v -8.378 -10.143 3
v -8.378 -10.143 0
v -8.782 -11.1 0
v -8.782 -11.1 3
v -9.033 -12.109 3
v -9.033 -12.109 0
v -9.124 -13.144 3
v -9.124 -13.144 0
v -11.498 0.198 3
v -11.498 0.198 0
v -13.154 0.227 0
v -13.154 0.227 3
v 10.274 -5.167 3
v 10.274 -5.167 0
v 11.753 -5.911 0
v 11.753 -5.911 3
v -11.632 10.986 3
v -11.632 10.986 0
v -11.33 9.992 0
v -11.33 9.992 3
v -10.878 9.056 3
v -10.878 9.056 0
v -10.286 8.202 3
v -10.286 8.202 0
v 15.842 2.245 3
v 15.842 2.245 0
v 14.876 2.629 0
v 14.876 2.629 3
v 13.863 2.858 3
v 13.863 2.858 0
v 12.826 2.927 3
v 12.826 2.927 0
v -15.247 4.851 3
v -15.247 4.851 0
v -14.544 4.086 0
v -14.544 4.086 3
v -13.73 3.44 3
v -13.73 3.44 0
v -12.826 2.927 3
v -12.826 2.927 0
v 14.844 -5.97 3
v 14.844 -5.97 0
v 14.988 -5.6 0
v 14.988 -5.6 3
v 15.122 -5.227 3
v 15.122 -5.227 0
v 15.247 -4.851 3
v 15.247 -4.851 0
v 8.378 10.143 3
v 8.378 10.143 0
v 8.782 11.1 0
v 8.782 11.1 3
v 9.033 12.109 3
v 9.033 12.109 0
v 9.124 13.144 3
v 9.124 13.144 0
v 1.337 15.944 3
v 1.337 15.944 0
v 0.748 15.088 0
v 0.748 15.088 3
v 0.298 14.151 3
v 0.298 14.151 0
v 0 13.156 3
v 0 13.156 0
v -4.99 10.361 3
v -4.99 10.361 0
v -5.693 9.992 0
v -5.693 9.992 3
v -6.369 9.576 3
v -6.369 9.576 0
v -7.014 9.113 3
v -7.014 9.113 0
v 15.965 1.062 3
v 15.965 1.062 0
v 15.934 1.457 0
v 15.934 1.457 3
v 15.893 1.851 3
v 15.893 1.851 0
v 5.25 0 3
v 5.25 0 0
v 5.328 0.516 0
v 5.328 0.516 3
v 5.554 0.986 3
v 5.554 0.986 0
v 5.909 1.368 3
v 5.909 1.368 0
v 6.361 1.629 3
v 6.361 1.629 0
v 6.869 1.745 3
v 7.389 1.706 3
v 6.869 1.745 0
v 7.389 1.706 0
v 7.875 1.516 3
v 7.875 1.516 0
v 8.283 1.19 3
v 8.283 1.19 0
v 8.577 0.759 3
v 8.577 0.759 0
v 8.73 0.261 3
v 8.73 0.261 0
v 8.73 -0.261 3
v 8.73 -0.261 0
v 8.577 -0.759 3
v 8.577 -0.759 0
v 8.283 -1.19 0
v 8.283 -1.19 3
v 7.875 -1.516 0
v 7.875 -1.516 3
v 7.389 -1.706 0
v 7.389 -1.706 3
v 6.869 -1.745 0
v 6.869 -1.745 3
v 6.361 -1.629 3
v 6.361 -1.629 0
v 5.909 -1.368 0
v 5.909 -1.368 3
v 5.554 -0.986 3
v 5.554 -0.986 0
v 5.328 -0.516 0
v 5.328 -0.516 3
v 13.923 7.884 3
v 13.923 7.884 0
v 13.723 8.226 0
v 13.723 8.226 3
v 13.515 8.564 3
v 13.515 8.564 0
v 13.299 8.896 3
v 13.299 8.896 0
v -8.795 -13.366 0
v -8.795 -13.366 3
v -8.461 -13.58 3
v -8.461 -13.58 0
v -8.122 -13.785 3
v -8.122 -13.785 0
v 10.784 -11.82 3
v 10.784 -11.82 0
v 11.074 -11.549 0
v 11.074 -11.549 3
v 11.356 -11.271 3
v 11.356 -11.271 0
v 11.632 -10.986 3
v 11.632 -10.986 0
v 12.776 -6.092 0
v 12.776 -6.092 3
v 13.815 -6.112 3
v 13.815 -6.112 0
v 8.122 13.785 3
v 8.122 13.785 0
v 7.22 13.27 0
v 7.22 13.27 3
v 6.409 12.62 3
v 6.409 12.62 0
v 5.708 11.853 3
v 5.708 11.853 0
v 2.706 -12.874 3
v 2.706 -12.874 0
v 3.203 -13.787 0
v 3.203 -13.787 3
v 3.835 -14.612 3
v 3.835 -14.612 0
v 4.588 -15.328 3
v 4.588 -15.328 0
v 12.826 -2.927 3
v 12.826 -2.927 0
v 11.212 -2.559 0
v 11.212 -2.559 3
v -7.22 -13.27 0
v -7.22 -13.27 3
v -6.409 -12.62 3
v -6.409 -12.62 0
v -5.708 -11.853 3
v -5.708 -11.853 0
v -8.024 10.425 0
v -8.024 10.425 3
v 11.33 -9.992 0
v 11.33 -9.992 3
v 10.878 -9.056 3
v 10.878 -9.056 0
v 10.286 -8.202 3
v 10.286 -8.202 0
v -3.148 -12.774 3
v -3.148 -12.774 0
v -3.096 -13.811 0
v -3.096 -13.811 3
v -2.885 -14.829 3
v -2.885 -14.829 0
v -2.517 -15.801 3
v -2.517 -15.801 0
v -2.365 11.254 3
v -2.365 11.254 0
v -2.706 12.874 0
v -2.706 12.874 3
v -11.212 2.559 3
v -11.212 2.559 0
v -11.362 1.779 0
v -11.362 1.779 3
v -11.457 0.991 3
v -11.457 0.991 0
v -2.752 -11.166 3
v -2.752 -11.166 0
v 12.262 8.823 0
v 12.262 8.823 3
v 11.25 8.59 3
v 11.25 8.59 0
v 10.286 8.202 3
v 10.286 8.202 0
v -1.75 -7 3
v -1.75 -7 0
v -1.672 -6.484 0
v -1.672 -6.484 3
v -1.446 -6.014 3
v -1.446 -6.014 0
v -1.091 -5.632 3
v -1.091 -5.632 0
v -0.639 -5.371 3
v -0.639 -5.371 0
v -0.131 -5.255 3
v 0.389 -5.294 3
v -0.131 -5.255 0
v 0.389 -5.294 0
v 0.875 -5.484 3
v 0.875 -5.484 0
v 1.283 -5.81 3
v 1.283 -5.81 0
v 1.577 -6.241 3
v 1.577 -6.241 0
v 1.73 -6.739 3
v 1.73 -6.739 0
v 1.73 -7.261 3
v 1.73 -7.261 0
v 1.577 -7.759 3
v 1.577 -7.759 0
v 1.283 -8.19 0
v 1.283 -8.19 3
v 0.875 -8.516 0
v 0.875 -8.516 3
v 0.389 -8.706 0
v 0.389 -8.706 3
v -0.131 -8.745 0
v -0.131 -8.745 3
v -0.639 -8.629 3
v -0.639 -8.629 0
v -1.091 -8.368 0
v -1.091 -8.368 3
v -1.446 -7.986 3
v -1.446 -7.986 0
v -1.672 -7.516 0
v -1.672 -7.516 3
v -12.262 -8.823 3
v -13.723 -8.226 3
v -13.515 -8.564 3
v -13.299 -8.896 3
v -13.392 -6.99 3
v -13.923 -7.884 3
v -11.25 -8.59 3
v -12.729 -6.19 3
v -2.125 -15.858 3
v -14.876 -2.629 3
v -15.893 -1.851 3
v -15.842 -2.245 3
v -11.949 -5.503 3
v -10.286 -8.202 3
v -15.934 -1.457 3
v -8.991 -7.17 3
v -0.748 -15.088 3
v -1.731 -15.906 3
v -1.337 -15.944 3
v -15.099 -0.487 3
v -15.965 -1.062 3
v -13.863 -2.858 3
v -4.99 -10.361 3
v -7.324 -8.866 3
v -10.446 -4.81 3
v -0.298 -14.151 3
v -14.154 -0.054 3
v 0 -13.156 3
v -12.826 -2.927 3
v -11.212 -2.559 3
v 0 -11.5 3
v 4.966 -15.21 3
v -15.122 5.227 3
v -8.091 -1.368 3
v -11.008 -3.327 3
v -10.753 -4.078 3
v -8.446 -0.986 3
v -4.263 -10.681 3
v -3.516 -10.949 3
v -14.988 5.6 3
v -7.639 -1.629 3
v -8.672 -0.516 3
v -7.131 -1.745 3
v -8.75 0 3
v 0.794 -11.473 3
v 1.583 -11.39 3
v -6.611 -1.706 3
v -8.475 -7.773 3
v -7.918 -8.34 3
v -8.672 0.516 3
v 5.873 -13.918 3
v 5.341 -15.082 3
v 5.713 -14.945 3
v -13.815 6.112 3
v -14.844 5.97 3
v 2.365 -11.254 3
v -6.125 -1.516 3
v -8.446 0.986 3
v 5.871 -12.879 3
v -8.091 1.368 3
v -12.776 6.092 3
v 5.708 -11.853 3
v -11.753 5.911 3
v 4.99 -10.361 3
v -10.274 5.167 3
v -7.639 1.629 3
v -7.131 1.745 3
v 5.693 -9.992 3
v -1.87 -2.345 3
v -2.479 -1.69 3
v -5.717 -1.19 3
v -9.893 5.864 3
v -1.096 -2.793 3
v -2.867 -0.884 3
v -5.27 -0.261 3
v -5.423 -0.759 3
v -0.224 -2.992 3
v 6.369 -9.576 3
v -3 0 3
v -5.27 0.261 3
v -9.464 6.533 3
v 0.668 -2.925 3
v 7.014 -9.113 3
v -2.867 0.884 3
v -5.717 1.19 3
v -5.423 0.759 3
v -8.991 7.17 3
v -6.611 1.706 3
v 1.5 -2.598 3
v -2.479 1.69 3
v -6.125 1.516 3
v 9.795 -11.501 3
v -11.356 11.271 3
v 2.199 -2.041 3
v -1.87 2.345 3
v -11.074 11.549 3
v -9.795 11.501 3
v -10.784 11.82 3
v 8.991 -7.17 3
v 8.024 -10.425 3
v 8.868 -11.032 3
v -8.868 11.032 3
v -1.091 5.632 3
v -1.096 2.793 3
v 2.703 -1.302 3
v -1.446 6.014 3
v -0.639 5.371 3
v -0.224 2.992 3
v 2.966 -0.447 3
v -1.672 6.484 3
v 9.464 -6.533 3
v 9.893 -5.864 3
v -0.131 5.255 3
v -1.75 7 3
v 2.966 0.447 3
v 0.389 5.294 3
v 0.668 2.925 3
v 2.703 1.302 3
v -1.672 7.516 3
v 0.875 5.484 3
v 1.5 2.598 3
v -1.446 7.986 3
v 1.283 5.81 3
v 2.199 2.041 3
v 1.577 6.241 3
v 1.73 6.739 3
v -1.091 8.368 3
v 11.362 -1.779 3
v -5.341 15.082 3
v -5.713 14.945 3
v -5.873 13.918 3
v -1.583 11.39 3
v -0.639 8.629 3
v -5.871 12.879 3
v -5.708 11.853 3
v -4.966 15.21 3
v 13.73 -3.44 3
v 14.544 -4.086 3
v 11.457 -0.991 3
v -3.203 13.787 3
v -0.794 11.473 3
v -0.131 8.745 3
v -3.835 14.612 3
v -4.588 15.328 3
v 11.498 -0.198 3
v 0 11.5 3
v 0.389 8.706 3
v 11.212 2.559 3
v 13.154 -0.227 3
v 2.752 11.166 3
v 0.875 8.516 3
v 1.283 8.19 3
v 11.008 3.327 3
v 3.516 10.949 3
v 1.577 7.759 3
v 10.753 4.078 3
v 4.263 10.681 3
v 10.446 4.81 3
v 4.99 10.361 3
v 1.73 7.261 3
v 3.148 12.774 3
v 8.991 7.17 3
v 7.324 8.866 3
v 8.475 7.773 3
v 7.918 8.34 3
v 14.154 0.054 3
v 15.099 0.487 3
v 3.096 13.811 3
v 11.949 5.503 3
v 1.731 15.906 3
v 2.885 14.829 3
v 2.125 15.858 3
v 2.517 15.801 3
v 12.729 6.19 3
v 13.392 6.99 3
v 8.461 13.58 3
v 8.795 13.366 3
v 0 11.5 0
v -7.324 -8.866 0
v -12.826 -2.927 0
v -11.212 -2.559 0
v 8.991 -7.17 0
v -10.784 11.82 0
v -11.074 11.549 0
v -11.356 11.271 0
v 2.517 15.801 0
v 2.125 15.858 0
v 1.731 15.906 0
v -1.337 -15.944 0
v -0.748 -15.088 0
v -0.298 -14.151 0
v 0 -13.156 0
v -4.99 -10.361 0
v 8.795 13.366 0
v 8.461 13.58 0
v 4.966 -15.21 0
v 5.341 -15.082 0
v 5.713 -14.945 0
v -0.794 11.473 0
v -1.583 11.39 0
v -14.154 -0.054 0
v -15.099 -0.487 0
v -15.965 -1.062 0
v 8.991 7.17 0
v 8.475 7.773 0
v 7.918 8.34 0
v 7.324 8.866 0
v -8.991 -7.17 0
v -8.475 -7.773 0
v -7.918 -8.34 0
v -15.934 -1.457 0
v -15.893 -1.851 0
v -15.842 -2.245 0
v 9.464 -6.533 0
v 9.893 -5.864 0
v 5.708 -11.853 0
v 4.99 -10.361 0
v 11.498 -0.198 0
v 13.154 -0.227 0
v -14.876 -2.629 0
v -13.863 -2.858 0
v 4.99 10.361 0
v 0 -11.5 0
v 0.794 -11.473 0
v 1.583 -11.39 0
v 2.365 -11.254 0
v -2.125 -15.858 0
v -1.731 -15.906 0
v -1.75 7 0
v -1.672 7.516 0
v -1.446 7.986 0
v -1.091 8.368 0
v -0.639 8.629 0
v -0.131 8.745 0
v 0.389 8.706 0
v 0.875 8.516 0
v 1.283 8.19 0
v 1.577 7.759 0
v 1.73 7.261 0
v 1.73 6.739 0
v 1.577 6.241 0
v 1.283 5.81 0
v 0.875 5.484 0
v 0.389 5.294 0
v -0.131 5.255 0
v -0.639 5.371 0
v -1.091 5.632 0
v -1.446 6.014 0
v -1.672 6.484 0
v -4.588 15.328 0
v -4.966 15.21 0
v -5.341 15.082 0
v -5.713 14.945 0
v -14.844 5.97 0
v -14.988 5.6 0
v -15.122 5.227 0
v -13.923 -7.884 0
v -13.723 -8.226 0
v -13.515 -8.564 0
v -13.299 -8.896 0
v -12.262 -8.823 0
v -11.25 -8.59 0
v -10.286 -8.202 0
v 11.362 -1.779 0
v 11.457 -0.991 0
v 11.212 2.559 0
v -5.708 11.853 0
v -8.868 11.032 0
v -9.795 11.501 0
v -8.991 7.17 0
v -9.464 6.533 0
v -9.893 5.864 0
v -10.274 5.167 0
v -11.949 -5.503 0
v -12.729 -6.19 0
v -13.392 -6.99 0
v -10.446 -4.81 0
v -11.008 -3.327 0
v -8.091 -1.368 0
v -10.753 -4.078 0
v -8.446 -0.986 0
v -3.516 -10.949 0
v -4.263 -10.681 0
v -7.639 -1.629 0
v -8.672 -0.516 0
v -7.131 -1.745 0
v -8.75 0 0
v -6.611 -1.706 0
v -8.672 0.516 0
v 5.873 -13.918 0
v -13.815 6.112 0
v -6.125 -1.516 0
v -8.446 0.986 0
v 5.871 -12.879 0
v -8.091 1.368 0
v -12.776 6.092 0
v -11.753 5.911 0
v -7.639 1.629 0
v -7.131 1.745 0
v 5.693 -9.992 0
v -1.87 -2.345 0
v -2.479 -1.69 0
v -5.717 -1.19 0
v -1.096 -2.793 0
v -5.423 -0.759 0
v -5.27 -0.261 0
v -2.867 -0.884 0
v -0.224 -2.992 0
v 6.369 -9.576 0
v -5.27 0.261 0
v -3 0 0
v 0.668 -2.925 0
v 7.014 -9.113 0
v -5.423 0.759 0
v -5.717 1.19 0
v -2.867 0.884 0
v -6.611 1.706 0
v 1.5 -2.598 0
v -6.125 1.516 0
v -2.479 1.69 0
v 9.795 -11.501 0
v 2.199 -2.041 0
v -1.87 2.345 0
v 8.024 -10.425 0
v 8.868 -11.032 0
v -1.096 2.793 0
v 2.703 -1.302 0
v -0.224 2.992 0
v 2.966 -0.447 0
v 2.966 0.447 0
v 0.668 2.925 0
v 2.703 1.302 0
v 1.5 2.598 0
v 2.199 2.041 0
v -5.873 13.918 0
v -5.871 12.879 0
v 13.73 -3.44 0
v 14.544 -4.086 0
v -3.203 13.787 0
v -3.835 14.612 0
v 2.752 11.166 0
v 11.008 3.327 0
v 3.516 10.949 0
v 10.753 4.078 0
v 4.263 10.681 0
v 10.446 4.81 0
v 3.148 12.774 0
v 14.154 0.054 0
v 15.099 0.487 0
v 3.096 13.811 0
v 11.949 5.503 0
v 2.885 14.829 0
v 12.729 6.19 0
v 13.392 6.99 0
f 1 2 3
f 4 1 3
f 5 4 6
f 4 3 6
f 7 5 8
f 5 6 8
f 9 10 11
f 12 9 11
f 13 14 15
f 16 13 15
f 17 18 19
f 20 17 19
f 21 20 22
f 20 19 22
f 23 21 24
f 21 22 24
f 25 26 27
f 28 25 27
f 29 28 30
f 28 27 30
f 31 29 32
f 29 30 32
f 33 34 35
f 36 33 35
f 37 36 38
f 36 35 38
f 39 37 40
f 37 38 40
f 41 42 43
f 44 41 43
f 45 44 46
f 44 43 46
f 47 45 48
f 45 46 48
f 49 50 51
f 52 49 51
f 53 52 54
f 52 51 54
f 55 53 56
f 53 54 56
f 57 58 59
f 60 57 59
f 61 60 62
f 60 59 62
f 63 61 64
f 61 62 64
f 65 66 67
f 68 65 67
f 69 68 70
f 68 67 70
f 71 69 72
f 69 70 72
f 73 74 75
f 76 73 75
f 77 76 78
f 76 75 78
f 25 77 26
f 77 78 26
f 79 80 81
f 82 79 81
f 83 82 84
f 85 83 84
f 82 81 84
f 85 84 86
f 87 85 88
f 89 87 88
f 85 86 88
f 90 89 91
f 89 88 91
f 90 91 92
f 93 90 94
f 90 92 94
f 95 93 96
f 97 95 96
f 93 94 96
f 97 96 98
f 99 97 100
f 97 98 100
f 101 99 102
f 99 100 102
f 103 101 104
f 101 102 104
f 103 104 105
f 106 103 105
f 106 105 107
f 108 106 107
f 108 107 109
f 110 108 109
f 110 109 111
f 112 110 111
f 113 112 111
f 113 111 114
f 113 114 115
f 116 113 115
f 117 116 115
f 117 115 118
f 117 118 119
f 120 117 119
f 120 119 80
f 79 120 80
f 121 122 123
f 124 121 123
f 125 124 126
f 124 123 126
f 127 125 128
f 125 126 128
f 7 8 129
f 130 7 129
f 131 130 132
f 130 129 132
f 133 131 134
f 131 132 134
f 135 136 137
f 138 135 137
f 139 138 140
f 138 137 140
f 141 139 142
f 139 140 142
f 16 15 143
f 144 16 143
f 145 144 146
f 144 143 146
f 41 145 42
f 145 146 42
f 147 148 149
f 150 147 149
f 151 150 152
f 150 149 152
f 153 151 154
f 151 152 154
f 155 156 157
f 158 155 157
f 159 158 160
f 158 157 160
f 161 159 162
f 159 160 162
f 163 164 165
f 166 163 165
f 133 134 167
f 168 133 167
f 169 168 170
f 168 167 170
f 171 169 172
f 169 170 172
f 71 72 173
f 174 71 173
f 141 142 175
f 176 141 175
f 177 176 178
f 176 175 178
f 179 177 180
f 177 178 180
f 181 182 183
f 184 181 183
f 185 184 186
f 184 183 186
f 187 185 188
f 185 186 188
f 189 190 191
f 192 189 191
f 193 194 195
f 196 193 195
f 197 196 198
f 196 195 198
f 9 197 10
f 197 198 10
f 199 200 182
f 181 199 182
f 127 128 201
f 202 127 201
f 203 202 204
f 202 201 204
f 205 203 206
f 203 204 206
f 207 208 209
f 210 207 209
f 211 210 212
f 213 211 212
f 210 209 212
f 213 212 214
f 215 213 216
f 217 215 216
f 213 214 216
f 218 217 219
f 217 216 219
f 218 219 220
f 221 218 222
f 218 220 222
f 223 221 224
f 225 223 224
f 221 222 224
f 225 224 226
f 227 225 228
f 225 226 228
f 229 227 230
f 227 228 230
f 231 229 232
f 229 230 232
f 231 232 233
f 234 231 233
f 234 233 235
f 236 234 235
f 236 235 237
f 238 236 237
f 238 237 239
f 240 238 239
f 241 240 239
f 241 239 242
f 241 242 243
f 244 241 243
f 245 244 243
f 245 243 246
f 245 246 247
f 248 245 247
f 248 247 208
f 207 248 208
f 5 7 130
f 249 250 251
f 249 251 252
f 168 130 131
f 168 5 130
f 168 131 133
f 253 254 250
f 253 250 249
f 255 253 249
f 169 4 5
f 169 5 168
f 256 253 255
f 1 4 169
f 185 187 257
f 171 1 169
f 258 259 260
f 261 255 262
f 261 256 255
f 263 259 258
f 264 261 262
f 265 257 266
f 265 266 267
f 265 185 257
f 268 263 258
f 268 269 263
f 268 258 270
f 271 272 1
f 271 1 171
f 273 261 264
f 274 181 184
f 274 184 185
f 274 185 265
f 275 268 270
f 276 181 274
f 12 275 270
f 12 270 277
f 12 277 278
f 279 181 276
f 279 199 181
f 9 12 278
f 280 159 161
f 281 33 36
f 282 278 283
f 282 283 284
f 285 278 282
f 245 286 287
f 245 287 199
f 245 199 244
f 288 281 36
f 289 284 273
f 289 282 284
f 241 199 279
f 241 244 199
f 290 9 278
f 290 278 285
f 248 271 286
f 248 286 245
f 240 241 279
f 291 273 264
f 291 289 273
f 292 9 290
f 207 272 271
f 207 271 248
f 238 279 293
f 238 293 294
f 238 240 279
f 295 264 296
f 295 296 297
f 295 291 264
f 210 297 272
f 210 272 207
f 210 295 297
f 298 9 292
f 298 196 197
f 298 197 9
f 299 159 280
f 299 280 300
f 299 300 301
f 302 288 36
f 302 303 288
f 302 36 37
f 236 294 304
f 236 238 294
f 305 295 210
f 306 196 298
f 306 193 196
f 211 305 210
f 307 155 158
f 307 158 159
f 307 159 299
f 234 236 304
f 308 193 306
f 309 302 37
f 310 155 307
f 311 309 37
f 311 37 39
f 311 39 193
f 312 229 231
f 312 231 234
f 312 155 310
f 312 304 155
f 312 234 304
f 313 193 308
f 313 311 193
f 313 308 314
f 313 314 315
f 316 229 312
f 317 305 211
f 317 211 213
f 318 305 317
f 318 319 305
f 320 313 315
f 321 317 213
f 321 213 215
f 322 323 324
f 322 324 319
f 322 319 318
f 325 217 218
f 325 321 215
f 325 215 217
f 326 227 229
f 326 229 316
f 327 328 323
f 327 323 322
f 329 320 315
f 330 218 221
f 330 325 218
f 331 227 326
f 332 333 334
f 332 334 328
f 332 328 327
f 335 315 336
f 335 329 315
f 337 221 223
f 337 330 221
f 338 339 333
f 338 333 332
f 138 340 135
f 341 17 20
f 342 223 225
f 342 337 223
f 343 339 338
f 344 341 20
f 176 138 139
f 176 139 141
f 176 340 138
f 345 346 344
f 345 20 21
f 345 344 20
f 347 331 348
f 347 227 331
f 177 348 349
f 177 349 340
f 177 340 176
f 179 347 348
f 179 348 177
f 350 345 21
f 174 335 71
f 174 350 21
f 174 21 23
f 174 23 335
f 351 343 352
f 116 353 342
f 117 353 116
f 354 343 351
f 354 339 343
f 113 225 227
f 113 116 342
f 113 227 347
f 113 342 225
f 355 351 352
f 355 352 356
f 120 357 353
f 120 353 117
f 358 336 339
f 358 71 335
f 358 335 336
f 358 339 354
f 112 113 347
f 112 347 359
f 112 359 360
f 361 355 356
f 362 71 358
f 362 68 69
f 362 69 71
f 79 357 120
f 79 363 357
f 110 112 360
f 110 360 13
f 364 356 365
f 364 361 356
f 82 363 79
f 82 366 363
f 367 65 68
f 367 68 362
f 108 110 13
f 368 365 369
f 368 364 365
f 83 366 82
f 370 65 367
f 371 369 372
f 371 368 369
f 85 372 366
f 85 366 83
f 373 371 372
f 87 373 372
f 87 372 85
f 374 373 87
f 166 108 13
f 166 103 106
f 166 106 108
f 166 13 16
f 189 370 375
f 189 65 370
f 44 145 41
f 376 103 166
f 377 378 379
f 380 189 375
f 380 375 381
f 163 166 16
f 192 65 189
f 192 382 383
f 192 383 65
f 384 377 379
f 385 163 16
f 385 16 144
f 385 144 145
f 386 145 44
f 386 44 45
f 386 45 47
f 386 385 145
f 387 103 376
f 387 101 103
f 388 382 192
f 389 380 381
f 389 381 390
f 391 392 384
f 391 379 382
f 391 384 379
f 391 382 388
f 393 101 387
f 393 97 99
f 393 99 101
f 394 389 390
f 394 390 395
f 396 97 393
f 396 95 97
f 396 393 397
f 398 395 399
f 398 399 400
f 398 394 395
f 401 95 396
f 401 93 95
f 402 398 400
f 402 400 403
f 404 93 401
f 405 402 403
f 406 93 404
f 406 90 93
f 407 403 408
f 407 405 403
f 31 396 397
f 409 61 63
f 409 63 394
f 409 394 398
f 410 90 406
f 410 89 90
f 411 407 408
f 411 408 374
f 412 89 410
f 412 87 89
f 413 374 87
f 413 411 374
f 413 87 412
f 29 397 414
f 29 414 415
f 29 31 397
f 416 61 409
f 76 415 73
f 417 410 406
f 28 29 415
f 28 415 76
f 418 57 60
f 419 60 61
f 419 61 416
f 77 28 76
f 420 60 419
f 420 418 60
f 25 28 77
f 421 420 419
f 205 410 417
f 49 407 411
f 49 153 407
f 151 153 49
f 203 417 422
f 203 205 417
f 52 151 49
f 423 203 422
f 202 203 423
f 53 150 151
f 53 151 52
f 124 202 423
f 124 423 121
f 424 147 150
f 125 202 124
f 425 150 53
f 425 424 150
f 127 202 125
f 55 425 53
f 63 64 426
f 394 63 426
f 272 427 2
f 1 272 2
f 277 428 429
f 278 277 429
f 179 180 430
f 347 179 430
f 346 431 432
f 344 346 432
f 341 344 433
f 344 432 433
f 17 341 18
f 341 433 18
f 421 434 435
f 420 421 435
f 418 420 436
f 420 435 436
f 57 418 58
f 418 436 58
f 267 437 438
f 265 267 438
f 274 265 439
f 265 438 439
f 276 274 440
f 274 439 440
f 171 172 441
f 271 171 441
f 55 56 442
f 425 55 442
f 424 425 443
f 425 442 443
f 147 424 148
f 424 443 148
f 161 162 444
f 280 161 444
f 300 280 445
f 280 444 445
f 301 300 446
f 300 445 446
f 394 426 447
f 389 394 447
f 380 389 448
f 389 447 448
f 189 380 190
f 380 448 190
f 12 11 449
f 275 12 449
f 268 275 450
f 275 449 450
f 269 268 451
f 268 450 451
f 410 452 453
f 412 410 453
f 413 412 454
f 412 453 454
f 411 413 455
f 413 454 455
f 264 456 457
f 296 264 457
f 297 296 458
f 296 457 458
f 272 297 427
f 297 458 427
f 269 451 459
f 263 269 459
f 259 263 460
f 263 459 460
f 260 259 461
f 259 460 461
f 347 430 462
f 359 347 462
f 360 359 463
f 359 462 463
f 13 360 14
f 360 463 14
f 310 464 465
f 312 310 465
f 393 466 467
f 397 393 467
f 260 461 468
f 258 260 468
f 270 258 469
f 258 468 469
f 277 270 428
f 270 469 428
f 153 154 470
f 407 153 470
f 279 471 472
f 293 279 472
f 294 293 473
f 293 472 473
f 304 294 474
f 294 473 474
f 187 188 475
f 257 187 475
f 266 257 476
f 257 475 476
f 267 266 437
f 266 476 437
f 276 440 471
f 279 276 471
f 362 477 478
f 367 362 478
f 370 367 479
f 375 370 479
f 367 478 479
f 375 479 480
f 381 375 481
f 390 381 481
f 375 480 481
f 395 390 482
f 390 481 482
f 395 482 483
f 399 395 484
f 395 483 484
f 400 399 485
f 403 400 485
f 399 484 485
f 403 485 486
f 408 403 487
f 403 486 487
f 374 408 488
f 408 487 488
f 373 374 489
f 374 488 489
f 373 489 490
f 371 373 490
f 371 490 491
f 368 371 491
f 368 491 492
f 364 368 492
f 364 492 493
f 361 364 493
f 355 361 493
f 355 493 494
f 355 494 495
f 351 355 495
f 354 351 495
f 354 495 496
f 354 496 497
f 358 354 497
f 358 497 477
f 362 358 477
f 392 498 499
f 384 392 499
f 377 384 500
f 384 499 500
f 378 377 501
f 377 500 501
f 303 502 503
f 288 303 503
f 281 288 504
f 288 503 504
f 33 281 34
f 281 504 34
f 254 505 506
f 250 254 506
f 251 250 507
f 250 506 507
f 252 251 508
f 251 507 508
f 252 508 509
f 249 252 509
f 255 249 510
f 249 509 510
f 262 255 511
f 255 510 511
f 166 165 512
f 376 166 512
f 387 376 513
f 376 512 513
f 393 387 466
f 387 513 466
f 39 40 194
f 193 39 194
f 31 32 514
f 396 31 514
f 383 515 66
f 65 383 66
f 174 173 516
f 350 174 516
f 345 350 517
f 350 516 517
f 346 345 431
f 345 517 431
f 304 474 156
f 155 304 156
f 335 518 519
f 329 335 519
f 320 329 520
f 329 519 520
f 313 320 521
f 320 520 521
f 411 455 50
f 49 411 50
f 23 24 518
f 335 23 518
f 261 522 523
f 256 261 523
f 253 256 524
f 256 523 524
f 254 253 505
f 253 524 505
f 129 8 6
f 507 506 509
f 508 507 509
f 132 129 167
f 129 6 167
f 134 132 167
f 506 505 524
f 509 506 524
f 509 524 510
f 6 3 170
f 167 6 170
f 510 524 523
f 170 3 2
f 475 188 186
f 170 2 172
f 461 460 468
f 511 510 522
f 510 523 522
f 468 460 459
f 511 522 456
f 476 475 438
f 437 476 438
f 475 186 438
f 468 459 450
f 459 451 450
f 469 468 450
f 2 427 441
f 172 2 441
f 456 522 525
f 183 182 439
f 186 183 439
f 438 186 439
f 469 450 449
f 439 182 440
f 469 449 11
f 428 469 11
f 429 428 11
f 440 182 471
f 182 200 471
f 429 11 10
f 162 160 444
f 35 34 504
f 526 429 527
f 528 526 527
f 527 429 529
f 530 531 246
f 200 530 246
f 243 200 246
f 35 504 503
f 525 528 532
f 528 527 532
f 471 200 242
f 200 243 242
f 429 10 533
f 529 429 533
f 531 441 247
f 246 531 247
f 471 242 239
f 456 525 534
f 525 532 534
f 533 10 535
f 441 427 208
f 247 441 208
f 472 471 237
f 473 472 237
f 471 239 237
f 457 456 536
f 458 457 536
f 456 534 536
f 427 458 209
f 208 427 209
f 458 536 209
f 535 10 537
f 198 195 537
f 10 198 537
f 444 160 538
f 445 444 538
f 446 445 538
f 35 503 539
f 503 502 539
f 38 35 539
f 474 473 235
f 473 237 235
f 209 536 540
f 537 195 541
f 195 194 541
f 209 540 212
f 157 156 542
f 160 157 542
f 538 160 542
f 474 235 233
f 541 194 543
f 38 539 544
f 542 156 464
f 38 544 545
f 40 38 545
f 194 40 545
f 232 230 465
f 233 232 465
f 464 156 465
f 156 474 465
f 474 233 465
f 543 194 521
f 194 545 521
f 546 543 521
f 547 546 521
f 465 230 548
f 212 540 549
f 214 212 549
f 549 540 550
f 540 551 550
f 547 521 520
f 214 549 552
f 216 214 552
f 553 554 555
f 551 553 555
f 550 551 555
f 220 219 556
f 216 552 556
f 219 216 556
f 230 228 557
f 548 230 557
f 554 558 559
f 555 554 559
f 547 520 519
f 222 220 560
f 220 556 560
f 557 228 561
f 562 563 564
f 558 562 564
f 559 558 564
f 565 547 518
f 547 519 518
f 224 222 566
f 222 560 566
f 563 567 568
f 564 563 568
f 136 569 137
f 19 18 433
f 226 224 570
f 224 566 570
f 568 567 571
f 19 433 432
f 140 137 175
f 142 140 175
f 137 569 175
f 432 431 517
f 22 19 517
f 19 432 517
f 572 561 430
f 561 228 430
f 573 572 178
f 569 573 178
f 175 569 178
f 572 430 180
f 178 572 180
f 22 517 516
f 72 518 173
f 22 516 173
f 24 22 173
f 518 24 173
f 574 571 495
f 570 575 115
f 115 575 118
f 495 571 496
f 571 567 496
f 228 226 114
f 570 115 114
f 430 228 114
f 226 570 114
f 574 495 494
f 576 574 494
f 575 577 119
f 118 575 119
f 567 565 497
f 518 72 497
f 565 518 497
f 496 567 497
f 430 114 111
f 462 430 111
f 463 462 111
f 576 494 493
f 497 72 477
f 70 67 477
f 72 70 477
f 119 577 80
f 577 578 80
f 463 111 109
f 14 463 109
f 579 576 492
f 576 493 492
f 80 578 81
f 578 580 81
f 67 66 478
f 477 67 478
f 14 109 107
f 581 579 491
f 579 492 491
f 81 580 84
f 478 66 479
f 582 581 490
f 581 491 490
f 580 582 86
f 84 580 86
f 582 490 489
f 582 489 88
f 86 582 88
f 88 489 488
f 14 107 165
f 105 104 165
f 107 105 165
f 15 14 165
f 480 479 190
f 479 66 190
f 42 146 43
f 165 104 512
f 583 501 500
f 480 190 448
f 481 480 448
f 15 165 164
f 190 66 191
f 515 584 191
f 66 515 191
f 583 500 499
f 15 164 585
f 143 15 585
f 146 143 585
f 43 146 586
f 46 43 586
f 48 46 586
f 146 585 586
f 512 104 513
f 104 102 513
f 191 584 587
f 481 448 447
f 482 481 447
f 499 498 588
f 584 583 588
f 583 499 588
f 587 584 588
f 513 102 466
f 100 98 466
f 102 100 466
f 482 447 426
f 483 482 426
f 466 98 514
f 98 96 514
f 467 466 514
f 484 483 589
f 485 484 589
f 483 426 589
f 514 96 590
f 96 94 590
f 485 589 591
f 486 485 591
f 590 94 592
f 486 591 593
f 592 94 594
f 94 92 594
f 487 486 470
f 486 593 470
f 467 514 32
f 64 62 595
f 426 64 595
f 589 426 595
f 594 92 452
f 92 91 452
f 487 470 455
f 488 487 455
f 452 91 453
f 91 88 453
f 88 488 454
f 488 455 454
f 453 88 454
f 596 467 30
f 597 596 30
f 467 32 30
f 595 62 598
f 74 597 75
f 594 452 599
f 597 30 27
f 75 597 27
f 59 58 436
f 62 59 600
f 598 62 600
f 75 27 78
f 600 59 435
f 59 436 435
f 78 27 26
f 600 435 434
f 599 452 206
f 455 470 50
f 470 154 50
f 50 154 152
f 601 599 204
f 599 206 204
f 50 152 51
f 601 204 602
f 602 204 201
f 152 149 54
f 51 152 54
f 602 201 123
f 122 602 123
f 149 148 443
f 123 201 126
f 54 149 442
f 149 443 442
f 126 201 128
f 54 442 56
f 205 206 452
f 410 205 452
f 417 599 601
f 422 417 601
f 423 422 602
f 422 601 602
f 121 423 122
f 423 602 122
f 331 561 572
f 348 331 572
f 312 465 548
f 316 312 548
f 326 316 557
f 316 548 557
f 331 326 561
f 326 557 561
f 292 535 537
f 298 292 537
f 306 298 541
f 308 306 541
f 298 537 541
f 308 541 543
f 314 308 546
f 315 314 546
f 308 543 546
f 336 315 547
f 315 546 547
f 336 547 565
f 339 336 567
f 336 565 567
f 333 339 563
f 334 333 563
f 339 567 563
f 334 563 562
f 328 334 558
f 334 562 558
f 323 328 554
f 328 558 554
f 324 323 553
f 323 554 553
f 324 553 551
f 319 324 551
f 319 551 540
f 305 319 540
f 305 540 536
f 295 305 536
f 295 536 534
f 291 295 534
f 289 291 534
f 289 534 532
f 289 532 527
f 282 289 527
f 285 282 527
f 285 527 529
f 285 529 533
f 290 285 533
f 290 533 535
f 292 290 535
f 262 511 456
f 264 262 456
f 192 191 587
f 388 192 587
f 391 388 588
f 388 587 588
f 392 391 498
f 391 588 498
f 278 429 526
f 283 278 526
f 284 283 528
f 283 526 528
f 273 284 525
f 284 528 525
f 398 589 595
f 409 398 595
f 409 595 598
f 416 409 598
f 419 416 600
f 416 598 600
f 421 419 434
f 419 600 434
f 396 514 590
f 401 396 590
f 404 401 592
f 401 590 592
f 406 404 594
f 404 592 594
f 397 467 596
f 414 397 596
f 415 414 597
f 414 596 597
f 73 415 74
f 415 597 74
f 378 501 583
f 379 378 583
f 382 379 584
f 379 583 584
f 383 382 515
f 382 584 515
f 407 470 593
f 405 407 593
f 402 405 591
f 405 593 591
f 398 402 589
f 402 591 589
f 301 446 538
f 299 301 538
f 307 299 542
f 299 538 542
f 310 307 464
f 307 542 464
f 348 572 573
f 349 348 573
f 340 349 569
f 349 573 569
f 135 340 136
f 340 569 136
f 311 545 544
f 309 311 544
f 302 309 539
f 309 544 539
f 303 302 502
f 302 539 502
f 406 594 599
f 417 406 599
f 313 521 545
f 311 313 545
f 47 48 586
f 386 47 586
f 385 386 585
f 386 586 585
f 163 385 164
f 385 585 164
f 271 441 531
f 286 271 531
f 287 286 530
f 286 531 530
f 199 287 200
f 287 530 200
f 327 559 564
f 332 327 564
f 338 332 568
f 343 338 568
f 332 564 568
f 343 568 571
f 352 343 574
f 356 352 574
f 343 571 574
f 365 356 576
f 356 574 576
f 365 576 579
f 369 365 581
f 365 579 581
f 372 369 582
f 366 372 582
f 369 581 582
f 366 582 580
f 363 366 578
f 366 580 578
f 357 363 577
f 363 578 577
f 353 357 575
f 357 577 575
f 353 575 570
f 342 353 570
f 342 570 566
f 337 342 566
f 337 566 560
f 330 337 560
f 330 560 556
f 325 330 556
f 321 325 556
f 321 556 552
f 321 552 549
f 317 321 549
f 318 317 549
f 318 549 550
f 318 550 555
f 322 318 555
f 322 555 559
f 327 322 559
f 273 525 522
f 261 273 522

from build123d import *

# Parameters (mm, degrees)
BOSS_EXTRU_1_DEPTH           = 3
R_P_TITION_CIRCULAIRE2_COUNT = 14
ESQUISSE5_R                  = 11.5
BOSS_EXTRU_2_DEPTH           = 3
ESQUISSE6_R                  = 3
ESQUISSE6_R_2                = 1.75
ENL_V_MAT_EXTRU_1_DEPTH      = 4


with BuildPart() as part:
    # Esquisse4 → Boss.-Extru.1 (new body)
    with BuildSketch(Plane.XY):
        with BuildLine():
            Line((0, 13.155696691), (0, 11.5))
            ThreePointArc((0, 11.5), (1.385979557, 11.416175396), (2.751754038, 11.165923594))
            Line((2.751754038, 11.165923594), (3.147934042, 12.773522094))
            ThreePointArc((3.147934042, 12.773522094), (3.010357566, 14.324173734), (2.517223611, 15.800746352))
            ThreePointArc((2.517223611, 15.800746352), (1.928319383, 15.883374464), (1.336751397, 15.944061456))
            ThreePointArc((1.336751397, 15.944061456), (0.504624377, 14.628382005), (0, 13.155696691))
        make_face()
    extrude(amount=BOSS_EXTRU_1_DEPTH)


with BuildPart() as r_p_tition_circulaire2_1:
    # Répétition circulaire2: pattern copy
    add(part.part.rotate(Axis((0, 0, 0), (0, 0, 1)), 1 * 360 / R_P_TITION_CIRCULAIRE2_COUNT))


with BuildPart() as r_p_tition_circulaire2_2:
    # Répétition circulaire2: pattern copy
    add(part.part.rotate(Axis((0, 0, 0), (0, 0, 1)), 2 * 360 / R_P_TITION_CIRCULAIRE2_COUNT))


with BuildPart() as r_p_tition_circulaire2_3:
    # Répétition circulaire2: pattern copy
    add(part.part.rotate(Axis((0, 0, 0), (0, 0, 1)), 3 * 360 / R_P_TITION_CIRCULAIRE2_COUNT))


with BuildPart() as r_p_tition_circulaire2_4:
    # Répétition circulaire2: pattern copy
    add(part.part.rotate(Axis((0, 0, 0), (0, 0, 1)), 4 * 360 / R_P_TITION_CIRCULAIRE2_COUNT))


with BuildPart() as r_p_tition_circulaire2_5:
    # Répétition circulaire2: pattern copy
    add(part.part.rotate(Axis((0, 0, 0), (0, 0, 1)), 5 * 360 / R_P_TITION_CIRCULAIRE2_COUNT))


with BuildPart() as r_p_tition_circulaire2_6:
    # Répétition circulaire2: pattern copy
    add(part.part.rotate(Axis((0, 0, 0), (0, 0, 1)), 6 * 360 / R_P_TITION_CIRCULAIRE2_COUNT))


with BuildPart() as r_p_tition_circulaire2_7:
    # Répétition circulaire2: pattern copy
    add(part.part.rotate(Axis((0, 0, 0), (0, 0, 1)), 7 * 360 / R_P_TITION_CIRCULAIRE2_COUNT))


with BuildPart() as r_p_tition_circulaire2_8:
    # Répétition circulaire2: pattern copy
    add(part.part.rotate(Axis((0, 0, 0), (0, 0, 1)), 8 * 360 / R_P_TITION_CIRCULAIRE2_COUNT))


with BuildPart() as r_p_tition_circulaire2_9:
    # Répétition circulaire2: pattern copy
    add(part.part.rotate(Axis((0, 0, 0), (0, 0, 1)), 9 * 360 / R_P_TITION_CIRCULAIRE2_COUNT))


with BuildPart() as r_p_tition_circulaire2_10:
    # Répétition circulaire2: pattern copy
    add(part.part.rotate(Axis((0, 0, 0), (0, 0, 1)), 10 * 360 / R_P_TITION_CIRCULAIRE2_COUNT))


with BuildPart() as r_p_tition_circulaire2_11:
    # Répétition circulaire2: pattern copy
    add(part.part.rotate(Axis((0, 0, 0), (0, 0, 1)), 11 * 360 / R_P_TITION_CIRCULAIRE2_COUNT))


with BuildPart() as r_p_tition_circulaire2_12:
    # Répétition circulaire2: pattern copy
    add(part.part.rotate(Axis((0, 0, 0), (0, 0, 1)), 12 * 360 / R_P_TITION_CIRCULAIRE2_COUNT))


with BuildPart() as r_p_tition_circulaire2_13:
    # Répétition circulaire2: pattern copy
    add(part.part.rotate(Axis((0, 0, 0), (0, 0, 1)), 13 * 360 / R_P_TITION_CIRCULAIRE2_COUNT))


with BuildPart() as part_1:
    add(part.part)

    add(r_p_tition_circulaire2_1.part)  # Boss.-Extru.2 merges Répétition circulaire2_1

    add(r_p_tition_circulaire2_2.part)  # Boss.-Extru.2 merges Répétition circulaire2_2

    add(r_p_tition_circulaire2_3.part)  # Boss.-Extru.2 merges Répétition circulaire2_3

    add(r_p_tition_circulaire2_4.part)  # Boss.-Extru.2 merges Répétition circulaire2_4

    add(r_p_tition_circulaire2_5.part)  # Boss.-Extru.2 merges Répétition circulaire2_5

    add(r_p_tition_circulaire2_6.part)  # Boss.-Extru.2 merges Répétition circulaire2_6

    add(r_p_tition_circulaire2_7.part)  # Boss.-Extru.2 merges Répétition circulaire2_7

    add(r_p_tition_circulaire2_8.part)  # Boss.-Extru.2 merges Répétition circulaire2_8

    add(r_p_tition_circulaire2_9.part)  # Boss.-Extru.2 merges Répétition circulaire2_9

    add(r_p_tition_circulaire2_10.part)  # Boss.-Extru.2 merges Répétition circulaire2_10

    add(r_p_tition_circulaire2_11.part)  # Boss.-Extru.2 merges Répétition circulaire2_11

    add(r_p_tition_circulaire2_12.part)  # Boss.-Extru.2 merges Répétition circulaire2_12

    add(r_p_tition_circulaire2_13.part)  # Boss.-Extru.2 merges Répétition circulaire2_13
    # Esquisse5 → Boss.-Extru.2 (add)
    with BuildSketch(Plane.XY):
        Circle(ESQUISSE5_R)
    extrude(amount=BOSS_EXTRU_2_DEPTH)

    # Esquisse6 → Enlèv. mat.-Extru.1 (cut, through all)
    with BuildSketch(Plane(origin=(0, 0, 0), x_dir=(-1, 0, 0), z_dir=(0, 0, -1))):
        Circle(ESQUISSE6_R)
        with Locations((0, 7)):
            Circle(ESQUISSE6_R_2)
        with Locations((7, 0)):
            Circle(ESQUISSE6_R_2)
        with Locations((0, -7)):
            Circle(ESQUISSE6_R_2)
        with Locations((-7, 0)):
            Circle(ESQUISSE6_R_2)
    extrude(amount=-ENL_V_MAT_EXTRU_1_DEPTH, mode=Mode.SUBTRACT)


solid = part_1.part
